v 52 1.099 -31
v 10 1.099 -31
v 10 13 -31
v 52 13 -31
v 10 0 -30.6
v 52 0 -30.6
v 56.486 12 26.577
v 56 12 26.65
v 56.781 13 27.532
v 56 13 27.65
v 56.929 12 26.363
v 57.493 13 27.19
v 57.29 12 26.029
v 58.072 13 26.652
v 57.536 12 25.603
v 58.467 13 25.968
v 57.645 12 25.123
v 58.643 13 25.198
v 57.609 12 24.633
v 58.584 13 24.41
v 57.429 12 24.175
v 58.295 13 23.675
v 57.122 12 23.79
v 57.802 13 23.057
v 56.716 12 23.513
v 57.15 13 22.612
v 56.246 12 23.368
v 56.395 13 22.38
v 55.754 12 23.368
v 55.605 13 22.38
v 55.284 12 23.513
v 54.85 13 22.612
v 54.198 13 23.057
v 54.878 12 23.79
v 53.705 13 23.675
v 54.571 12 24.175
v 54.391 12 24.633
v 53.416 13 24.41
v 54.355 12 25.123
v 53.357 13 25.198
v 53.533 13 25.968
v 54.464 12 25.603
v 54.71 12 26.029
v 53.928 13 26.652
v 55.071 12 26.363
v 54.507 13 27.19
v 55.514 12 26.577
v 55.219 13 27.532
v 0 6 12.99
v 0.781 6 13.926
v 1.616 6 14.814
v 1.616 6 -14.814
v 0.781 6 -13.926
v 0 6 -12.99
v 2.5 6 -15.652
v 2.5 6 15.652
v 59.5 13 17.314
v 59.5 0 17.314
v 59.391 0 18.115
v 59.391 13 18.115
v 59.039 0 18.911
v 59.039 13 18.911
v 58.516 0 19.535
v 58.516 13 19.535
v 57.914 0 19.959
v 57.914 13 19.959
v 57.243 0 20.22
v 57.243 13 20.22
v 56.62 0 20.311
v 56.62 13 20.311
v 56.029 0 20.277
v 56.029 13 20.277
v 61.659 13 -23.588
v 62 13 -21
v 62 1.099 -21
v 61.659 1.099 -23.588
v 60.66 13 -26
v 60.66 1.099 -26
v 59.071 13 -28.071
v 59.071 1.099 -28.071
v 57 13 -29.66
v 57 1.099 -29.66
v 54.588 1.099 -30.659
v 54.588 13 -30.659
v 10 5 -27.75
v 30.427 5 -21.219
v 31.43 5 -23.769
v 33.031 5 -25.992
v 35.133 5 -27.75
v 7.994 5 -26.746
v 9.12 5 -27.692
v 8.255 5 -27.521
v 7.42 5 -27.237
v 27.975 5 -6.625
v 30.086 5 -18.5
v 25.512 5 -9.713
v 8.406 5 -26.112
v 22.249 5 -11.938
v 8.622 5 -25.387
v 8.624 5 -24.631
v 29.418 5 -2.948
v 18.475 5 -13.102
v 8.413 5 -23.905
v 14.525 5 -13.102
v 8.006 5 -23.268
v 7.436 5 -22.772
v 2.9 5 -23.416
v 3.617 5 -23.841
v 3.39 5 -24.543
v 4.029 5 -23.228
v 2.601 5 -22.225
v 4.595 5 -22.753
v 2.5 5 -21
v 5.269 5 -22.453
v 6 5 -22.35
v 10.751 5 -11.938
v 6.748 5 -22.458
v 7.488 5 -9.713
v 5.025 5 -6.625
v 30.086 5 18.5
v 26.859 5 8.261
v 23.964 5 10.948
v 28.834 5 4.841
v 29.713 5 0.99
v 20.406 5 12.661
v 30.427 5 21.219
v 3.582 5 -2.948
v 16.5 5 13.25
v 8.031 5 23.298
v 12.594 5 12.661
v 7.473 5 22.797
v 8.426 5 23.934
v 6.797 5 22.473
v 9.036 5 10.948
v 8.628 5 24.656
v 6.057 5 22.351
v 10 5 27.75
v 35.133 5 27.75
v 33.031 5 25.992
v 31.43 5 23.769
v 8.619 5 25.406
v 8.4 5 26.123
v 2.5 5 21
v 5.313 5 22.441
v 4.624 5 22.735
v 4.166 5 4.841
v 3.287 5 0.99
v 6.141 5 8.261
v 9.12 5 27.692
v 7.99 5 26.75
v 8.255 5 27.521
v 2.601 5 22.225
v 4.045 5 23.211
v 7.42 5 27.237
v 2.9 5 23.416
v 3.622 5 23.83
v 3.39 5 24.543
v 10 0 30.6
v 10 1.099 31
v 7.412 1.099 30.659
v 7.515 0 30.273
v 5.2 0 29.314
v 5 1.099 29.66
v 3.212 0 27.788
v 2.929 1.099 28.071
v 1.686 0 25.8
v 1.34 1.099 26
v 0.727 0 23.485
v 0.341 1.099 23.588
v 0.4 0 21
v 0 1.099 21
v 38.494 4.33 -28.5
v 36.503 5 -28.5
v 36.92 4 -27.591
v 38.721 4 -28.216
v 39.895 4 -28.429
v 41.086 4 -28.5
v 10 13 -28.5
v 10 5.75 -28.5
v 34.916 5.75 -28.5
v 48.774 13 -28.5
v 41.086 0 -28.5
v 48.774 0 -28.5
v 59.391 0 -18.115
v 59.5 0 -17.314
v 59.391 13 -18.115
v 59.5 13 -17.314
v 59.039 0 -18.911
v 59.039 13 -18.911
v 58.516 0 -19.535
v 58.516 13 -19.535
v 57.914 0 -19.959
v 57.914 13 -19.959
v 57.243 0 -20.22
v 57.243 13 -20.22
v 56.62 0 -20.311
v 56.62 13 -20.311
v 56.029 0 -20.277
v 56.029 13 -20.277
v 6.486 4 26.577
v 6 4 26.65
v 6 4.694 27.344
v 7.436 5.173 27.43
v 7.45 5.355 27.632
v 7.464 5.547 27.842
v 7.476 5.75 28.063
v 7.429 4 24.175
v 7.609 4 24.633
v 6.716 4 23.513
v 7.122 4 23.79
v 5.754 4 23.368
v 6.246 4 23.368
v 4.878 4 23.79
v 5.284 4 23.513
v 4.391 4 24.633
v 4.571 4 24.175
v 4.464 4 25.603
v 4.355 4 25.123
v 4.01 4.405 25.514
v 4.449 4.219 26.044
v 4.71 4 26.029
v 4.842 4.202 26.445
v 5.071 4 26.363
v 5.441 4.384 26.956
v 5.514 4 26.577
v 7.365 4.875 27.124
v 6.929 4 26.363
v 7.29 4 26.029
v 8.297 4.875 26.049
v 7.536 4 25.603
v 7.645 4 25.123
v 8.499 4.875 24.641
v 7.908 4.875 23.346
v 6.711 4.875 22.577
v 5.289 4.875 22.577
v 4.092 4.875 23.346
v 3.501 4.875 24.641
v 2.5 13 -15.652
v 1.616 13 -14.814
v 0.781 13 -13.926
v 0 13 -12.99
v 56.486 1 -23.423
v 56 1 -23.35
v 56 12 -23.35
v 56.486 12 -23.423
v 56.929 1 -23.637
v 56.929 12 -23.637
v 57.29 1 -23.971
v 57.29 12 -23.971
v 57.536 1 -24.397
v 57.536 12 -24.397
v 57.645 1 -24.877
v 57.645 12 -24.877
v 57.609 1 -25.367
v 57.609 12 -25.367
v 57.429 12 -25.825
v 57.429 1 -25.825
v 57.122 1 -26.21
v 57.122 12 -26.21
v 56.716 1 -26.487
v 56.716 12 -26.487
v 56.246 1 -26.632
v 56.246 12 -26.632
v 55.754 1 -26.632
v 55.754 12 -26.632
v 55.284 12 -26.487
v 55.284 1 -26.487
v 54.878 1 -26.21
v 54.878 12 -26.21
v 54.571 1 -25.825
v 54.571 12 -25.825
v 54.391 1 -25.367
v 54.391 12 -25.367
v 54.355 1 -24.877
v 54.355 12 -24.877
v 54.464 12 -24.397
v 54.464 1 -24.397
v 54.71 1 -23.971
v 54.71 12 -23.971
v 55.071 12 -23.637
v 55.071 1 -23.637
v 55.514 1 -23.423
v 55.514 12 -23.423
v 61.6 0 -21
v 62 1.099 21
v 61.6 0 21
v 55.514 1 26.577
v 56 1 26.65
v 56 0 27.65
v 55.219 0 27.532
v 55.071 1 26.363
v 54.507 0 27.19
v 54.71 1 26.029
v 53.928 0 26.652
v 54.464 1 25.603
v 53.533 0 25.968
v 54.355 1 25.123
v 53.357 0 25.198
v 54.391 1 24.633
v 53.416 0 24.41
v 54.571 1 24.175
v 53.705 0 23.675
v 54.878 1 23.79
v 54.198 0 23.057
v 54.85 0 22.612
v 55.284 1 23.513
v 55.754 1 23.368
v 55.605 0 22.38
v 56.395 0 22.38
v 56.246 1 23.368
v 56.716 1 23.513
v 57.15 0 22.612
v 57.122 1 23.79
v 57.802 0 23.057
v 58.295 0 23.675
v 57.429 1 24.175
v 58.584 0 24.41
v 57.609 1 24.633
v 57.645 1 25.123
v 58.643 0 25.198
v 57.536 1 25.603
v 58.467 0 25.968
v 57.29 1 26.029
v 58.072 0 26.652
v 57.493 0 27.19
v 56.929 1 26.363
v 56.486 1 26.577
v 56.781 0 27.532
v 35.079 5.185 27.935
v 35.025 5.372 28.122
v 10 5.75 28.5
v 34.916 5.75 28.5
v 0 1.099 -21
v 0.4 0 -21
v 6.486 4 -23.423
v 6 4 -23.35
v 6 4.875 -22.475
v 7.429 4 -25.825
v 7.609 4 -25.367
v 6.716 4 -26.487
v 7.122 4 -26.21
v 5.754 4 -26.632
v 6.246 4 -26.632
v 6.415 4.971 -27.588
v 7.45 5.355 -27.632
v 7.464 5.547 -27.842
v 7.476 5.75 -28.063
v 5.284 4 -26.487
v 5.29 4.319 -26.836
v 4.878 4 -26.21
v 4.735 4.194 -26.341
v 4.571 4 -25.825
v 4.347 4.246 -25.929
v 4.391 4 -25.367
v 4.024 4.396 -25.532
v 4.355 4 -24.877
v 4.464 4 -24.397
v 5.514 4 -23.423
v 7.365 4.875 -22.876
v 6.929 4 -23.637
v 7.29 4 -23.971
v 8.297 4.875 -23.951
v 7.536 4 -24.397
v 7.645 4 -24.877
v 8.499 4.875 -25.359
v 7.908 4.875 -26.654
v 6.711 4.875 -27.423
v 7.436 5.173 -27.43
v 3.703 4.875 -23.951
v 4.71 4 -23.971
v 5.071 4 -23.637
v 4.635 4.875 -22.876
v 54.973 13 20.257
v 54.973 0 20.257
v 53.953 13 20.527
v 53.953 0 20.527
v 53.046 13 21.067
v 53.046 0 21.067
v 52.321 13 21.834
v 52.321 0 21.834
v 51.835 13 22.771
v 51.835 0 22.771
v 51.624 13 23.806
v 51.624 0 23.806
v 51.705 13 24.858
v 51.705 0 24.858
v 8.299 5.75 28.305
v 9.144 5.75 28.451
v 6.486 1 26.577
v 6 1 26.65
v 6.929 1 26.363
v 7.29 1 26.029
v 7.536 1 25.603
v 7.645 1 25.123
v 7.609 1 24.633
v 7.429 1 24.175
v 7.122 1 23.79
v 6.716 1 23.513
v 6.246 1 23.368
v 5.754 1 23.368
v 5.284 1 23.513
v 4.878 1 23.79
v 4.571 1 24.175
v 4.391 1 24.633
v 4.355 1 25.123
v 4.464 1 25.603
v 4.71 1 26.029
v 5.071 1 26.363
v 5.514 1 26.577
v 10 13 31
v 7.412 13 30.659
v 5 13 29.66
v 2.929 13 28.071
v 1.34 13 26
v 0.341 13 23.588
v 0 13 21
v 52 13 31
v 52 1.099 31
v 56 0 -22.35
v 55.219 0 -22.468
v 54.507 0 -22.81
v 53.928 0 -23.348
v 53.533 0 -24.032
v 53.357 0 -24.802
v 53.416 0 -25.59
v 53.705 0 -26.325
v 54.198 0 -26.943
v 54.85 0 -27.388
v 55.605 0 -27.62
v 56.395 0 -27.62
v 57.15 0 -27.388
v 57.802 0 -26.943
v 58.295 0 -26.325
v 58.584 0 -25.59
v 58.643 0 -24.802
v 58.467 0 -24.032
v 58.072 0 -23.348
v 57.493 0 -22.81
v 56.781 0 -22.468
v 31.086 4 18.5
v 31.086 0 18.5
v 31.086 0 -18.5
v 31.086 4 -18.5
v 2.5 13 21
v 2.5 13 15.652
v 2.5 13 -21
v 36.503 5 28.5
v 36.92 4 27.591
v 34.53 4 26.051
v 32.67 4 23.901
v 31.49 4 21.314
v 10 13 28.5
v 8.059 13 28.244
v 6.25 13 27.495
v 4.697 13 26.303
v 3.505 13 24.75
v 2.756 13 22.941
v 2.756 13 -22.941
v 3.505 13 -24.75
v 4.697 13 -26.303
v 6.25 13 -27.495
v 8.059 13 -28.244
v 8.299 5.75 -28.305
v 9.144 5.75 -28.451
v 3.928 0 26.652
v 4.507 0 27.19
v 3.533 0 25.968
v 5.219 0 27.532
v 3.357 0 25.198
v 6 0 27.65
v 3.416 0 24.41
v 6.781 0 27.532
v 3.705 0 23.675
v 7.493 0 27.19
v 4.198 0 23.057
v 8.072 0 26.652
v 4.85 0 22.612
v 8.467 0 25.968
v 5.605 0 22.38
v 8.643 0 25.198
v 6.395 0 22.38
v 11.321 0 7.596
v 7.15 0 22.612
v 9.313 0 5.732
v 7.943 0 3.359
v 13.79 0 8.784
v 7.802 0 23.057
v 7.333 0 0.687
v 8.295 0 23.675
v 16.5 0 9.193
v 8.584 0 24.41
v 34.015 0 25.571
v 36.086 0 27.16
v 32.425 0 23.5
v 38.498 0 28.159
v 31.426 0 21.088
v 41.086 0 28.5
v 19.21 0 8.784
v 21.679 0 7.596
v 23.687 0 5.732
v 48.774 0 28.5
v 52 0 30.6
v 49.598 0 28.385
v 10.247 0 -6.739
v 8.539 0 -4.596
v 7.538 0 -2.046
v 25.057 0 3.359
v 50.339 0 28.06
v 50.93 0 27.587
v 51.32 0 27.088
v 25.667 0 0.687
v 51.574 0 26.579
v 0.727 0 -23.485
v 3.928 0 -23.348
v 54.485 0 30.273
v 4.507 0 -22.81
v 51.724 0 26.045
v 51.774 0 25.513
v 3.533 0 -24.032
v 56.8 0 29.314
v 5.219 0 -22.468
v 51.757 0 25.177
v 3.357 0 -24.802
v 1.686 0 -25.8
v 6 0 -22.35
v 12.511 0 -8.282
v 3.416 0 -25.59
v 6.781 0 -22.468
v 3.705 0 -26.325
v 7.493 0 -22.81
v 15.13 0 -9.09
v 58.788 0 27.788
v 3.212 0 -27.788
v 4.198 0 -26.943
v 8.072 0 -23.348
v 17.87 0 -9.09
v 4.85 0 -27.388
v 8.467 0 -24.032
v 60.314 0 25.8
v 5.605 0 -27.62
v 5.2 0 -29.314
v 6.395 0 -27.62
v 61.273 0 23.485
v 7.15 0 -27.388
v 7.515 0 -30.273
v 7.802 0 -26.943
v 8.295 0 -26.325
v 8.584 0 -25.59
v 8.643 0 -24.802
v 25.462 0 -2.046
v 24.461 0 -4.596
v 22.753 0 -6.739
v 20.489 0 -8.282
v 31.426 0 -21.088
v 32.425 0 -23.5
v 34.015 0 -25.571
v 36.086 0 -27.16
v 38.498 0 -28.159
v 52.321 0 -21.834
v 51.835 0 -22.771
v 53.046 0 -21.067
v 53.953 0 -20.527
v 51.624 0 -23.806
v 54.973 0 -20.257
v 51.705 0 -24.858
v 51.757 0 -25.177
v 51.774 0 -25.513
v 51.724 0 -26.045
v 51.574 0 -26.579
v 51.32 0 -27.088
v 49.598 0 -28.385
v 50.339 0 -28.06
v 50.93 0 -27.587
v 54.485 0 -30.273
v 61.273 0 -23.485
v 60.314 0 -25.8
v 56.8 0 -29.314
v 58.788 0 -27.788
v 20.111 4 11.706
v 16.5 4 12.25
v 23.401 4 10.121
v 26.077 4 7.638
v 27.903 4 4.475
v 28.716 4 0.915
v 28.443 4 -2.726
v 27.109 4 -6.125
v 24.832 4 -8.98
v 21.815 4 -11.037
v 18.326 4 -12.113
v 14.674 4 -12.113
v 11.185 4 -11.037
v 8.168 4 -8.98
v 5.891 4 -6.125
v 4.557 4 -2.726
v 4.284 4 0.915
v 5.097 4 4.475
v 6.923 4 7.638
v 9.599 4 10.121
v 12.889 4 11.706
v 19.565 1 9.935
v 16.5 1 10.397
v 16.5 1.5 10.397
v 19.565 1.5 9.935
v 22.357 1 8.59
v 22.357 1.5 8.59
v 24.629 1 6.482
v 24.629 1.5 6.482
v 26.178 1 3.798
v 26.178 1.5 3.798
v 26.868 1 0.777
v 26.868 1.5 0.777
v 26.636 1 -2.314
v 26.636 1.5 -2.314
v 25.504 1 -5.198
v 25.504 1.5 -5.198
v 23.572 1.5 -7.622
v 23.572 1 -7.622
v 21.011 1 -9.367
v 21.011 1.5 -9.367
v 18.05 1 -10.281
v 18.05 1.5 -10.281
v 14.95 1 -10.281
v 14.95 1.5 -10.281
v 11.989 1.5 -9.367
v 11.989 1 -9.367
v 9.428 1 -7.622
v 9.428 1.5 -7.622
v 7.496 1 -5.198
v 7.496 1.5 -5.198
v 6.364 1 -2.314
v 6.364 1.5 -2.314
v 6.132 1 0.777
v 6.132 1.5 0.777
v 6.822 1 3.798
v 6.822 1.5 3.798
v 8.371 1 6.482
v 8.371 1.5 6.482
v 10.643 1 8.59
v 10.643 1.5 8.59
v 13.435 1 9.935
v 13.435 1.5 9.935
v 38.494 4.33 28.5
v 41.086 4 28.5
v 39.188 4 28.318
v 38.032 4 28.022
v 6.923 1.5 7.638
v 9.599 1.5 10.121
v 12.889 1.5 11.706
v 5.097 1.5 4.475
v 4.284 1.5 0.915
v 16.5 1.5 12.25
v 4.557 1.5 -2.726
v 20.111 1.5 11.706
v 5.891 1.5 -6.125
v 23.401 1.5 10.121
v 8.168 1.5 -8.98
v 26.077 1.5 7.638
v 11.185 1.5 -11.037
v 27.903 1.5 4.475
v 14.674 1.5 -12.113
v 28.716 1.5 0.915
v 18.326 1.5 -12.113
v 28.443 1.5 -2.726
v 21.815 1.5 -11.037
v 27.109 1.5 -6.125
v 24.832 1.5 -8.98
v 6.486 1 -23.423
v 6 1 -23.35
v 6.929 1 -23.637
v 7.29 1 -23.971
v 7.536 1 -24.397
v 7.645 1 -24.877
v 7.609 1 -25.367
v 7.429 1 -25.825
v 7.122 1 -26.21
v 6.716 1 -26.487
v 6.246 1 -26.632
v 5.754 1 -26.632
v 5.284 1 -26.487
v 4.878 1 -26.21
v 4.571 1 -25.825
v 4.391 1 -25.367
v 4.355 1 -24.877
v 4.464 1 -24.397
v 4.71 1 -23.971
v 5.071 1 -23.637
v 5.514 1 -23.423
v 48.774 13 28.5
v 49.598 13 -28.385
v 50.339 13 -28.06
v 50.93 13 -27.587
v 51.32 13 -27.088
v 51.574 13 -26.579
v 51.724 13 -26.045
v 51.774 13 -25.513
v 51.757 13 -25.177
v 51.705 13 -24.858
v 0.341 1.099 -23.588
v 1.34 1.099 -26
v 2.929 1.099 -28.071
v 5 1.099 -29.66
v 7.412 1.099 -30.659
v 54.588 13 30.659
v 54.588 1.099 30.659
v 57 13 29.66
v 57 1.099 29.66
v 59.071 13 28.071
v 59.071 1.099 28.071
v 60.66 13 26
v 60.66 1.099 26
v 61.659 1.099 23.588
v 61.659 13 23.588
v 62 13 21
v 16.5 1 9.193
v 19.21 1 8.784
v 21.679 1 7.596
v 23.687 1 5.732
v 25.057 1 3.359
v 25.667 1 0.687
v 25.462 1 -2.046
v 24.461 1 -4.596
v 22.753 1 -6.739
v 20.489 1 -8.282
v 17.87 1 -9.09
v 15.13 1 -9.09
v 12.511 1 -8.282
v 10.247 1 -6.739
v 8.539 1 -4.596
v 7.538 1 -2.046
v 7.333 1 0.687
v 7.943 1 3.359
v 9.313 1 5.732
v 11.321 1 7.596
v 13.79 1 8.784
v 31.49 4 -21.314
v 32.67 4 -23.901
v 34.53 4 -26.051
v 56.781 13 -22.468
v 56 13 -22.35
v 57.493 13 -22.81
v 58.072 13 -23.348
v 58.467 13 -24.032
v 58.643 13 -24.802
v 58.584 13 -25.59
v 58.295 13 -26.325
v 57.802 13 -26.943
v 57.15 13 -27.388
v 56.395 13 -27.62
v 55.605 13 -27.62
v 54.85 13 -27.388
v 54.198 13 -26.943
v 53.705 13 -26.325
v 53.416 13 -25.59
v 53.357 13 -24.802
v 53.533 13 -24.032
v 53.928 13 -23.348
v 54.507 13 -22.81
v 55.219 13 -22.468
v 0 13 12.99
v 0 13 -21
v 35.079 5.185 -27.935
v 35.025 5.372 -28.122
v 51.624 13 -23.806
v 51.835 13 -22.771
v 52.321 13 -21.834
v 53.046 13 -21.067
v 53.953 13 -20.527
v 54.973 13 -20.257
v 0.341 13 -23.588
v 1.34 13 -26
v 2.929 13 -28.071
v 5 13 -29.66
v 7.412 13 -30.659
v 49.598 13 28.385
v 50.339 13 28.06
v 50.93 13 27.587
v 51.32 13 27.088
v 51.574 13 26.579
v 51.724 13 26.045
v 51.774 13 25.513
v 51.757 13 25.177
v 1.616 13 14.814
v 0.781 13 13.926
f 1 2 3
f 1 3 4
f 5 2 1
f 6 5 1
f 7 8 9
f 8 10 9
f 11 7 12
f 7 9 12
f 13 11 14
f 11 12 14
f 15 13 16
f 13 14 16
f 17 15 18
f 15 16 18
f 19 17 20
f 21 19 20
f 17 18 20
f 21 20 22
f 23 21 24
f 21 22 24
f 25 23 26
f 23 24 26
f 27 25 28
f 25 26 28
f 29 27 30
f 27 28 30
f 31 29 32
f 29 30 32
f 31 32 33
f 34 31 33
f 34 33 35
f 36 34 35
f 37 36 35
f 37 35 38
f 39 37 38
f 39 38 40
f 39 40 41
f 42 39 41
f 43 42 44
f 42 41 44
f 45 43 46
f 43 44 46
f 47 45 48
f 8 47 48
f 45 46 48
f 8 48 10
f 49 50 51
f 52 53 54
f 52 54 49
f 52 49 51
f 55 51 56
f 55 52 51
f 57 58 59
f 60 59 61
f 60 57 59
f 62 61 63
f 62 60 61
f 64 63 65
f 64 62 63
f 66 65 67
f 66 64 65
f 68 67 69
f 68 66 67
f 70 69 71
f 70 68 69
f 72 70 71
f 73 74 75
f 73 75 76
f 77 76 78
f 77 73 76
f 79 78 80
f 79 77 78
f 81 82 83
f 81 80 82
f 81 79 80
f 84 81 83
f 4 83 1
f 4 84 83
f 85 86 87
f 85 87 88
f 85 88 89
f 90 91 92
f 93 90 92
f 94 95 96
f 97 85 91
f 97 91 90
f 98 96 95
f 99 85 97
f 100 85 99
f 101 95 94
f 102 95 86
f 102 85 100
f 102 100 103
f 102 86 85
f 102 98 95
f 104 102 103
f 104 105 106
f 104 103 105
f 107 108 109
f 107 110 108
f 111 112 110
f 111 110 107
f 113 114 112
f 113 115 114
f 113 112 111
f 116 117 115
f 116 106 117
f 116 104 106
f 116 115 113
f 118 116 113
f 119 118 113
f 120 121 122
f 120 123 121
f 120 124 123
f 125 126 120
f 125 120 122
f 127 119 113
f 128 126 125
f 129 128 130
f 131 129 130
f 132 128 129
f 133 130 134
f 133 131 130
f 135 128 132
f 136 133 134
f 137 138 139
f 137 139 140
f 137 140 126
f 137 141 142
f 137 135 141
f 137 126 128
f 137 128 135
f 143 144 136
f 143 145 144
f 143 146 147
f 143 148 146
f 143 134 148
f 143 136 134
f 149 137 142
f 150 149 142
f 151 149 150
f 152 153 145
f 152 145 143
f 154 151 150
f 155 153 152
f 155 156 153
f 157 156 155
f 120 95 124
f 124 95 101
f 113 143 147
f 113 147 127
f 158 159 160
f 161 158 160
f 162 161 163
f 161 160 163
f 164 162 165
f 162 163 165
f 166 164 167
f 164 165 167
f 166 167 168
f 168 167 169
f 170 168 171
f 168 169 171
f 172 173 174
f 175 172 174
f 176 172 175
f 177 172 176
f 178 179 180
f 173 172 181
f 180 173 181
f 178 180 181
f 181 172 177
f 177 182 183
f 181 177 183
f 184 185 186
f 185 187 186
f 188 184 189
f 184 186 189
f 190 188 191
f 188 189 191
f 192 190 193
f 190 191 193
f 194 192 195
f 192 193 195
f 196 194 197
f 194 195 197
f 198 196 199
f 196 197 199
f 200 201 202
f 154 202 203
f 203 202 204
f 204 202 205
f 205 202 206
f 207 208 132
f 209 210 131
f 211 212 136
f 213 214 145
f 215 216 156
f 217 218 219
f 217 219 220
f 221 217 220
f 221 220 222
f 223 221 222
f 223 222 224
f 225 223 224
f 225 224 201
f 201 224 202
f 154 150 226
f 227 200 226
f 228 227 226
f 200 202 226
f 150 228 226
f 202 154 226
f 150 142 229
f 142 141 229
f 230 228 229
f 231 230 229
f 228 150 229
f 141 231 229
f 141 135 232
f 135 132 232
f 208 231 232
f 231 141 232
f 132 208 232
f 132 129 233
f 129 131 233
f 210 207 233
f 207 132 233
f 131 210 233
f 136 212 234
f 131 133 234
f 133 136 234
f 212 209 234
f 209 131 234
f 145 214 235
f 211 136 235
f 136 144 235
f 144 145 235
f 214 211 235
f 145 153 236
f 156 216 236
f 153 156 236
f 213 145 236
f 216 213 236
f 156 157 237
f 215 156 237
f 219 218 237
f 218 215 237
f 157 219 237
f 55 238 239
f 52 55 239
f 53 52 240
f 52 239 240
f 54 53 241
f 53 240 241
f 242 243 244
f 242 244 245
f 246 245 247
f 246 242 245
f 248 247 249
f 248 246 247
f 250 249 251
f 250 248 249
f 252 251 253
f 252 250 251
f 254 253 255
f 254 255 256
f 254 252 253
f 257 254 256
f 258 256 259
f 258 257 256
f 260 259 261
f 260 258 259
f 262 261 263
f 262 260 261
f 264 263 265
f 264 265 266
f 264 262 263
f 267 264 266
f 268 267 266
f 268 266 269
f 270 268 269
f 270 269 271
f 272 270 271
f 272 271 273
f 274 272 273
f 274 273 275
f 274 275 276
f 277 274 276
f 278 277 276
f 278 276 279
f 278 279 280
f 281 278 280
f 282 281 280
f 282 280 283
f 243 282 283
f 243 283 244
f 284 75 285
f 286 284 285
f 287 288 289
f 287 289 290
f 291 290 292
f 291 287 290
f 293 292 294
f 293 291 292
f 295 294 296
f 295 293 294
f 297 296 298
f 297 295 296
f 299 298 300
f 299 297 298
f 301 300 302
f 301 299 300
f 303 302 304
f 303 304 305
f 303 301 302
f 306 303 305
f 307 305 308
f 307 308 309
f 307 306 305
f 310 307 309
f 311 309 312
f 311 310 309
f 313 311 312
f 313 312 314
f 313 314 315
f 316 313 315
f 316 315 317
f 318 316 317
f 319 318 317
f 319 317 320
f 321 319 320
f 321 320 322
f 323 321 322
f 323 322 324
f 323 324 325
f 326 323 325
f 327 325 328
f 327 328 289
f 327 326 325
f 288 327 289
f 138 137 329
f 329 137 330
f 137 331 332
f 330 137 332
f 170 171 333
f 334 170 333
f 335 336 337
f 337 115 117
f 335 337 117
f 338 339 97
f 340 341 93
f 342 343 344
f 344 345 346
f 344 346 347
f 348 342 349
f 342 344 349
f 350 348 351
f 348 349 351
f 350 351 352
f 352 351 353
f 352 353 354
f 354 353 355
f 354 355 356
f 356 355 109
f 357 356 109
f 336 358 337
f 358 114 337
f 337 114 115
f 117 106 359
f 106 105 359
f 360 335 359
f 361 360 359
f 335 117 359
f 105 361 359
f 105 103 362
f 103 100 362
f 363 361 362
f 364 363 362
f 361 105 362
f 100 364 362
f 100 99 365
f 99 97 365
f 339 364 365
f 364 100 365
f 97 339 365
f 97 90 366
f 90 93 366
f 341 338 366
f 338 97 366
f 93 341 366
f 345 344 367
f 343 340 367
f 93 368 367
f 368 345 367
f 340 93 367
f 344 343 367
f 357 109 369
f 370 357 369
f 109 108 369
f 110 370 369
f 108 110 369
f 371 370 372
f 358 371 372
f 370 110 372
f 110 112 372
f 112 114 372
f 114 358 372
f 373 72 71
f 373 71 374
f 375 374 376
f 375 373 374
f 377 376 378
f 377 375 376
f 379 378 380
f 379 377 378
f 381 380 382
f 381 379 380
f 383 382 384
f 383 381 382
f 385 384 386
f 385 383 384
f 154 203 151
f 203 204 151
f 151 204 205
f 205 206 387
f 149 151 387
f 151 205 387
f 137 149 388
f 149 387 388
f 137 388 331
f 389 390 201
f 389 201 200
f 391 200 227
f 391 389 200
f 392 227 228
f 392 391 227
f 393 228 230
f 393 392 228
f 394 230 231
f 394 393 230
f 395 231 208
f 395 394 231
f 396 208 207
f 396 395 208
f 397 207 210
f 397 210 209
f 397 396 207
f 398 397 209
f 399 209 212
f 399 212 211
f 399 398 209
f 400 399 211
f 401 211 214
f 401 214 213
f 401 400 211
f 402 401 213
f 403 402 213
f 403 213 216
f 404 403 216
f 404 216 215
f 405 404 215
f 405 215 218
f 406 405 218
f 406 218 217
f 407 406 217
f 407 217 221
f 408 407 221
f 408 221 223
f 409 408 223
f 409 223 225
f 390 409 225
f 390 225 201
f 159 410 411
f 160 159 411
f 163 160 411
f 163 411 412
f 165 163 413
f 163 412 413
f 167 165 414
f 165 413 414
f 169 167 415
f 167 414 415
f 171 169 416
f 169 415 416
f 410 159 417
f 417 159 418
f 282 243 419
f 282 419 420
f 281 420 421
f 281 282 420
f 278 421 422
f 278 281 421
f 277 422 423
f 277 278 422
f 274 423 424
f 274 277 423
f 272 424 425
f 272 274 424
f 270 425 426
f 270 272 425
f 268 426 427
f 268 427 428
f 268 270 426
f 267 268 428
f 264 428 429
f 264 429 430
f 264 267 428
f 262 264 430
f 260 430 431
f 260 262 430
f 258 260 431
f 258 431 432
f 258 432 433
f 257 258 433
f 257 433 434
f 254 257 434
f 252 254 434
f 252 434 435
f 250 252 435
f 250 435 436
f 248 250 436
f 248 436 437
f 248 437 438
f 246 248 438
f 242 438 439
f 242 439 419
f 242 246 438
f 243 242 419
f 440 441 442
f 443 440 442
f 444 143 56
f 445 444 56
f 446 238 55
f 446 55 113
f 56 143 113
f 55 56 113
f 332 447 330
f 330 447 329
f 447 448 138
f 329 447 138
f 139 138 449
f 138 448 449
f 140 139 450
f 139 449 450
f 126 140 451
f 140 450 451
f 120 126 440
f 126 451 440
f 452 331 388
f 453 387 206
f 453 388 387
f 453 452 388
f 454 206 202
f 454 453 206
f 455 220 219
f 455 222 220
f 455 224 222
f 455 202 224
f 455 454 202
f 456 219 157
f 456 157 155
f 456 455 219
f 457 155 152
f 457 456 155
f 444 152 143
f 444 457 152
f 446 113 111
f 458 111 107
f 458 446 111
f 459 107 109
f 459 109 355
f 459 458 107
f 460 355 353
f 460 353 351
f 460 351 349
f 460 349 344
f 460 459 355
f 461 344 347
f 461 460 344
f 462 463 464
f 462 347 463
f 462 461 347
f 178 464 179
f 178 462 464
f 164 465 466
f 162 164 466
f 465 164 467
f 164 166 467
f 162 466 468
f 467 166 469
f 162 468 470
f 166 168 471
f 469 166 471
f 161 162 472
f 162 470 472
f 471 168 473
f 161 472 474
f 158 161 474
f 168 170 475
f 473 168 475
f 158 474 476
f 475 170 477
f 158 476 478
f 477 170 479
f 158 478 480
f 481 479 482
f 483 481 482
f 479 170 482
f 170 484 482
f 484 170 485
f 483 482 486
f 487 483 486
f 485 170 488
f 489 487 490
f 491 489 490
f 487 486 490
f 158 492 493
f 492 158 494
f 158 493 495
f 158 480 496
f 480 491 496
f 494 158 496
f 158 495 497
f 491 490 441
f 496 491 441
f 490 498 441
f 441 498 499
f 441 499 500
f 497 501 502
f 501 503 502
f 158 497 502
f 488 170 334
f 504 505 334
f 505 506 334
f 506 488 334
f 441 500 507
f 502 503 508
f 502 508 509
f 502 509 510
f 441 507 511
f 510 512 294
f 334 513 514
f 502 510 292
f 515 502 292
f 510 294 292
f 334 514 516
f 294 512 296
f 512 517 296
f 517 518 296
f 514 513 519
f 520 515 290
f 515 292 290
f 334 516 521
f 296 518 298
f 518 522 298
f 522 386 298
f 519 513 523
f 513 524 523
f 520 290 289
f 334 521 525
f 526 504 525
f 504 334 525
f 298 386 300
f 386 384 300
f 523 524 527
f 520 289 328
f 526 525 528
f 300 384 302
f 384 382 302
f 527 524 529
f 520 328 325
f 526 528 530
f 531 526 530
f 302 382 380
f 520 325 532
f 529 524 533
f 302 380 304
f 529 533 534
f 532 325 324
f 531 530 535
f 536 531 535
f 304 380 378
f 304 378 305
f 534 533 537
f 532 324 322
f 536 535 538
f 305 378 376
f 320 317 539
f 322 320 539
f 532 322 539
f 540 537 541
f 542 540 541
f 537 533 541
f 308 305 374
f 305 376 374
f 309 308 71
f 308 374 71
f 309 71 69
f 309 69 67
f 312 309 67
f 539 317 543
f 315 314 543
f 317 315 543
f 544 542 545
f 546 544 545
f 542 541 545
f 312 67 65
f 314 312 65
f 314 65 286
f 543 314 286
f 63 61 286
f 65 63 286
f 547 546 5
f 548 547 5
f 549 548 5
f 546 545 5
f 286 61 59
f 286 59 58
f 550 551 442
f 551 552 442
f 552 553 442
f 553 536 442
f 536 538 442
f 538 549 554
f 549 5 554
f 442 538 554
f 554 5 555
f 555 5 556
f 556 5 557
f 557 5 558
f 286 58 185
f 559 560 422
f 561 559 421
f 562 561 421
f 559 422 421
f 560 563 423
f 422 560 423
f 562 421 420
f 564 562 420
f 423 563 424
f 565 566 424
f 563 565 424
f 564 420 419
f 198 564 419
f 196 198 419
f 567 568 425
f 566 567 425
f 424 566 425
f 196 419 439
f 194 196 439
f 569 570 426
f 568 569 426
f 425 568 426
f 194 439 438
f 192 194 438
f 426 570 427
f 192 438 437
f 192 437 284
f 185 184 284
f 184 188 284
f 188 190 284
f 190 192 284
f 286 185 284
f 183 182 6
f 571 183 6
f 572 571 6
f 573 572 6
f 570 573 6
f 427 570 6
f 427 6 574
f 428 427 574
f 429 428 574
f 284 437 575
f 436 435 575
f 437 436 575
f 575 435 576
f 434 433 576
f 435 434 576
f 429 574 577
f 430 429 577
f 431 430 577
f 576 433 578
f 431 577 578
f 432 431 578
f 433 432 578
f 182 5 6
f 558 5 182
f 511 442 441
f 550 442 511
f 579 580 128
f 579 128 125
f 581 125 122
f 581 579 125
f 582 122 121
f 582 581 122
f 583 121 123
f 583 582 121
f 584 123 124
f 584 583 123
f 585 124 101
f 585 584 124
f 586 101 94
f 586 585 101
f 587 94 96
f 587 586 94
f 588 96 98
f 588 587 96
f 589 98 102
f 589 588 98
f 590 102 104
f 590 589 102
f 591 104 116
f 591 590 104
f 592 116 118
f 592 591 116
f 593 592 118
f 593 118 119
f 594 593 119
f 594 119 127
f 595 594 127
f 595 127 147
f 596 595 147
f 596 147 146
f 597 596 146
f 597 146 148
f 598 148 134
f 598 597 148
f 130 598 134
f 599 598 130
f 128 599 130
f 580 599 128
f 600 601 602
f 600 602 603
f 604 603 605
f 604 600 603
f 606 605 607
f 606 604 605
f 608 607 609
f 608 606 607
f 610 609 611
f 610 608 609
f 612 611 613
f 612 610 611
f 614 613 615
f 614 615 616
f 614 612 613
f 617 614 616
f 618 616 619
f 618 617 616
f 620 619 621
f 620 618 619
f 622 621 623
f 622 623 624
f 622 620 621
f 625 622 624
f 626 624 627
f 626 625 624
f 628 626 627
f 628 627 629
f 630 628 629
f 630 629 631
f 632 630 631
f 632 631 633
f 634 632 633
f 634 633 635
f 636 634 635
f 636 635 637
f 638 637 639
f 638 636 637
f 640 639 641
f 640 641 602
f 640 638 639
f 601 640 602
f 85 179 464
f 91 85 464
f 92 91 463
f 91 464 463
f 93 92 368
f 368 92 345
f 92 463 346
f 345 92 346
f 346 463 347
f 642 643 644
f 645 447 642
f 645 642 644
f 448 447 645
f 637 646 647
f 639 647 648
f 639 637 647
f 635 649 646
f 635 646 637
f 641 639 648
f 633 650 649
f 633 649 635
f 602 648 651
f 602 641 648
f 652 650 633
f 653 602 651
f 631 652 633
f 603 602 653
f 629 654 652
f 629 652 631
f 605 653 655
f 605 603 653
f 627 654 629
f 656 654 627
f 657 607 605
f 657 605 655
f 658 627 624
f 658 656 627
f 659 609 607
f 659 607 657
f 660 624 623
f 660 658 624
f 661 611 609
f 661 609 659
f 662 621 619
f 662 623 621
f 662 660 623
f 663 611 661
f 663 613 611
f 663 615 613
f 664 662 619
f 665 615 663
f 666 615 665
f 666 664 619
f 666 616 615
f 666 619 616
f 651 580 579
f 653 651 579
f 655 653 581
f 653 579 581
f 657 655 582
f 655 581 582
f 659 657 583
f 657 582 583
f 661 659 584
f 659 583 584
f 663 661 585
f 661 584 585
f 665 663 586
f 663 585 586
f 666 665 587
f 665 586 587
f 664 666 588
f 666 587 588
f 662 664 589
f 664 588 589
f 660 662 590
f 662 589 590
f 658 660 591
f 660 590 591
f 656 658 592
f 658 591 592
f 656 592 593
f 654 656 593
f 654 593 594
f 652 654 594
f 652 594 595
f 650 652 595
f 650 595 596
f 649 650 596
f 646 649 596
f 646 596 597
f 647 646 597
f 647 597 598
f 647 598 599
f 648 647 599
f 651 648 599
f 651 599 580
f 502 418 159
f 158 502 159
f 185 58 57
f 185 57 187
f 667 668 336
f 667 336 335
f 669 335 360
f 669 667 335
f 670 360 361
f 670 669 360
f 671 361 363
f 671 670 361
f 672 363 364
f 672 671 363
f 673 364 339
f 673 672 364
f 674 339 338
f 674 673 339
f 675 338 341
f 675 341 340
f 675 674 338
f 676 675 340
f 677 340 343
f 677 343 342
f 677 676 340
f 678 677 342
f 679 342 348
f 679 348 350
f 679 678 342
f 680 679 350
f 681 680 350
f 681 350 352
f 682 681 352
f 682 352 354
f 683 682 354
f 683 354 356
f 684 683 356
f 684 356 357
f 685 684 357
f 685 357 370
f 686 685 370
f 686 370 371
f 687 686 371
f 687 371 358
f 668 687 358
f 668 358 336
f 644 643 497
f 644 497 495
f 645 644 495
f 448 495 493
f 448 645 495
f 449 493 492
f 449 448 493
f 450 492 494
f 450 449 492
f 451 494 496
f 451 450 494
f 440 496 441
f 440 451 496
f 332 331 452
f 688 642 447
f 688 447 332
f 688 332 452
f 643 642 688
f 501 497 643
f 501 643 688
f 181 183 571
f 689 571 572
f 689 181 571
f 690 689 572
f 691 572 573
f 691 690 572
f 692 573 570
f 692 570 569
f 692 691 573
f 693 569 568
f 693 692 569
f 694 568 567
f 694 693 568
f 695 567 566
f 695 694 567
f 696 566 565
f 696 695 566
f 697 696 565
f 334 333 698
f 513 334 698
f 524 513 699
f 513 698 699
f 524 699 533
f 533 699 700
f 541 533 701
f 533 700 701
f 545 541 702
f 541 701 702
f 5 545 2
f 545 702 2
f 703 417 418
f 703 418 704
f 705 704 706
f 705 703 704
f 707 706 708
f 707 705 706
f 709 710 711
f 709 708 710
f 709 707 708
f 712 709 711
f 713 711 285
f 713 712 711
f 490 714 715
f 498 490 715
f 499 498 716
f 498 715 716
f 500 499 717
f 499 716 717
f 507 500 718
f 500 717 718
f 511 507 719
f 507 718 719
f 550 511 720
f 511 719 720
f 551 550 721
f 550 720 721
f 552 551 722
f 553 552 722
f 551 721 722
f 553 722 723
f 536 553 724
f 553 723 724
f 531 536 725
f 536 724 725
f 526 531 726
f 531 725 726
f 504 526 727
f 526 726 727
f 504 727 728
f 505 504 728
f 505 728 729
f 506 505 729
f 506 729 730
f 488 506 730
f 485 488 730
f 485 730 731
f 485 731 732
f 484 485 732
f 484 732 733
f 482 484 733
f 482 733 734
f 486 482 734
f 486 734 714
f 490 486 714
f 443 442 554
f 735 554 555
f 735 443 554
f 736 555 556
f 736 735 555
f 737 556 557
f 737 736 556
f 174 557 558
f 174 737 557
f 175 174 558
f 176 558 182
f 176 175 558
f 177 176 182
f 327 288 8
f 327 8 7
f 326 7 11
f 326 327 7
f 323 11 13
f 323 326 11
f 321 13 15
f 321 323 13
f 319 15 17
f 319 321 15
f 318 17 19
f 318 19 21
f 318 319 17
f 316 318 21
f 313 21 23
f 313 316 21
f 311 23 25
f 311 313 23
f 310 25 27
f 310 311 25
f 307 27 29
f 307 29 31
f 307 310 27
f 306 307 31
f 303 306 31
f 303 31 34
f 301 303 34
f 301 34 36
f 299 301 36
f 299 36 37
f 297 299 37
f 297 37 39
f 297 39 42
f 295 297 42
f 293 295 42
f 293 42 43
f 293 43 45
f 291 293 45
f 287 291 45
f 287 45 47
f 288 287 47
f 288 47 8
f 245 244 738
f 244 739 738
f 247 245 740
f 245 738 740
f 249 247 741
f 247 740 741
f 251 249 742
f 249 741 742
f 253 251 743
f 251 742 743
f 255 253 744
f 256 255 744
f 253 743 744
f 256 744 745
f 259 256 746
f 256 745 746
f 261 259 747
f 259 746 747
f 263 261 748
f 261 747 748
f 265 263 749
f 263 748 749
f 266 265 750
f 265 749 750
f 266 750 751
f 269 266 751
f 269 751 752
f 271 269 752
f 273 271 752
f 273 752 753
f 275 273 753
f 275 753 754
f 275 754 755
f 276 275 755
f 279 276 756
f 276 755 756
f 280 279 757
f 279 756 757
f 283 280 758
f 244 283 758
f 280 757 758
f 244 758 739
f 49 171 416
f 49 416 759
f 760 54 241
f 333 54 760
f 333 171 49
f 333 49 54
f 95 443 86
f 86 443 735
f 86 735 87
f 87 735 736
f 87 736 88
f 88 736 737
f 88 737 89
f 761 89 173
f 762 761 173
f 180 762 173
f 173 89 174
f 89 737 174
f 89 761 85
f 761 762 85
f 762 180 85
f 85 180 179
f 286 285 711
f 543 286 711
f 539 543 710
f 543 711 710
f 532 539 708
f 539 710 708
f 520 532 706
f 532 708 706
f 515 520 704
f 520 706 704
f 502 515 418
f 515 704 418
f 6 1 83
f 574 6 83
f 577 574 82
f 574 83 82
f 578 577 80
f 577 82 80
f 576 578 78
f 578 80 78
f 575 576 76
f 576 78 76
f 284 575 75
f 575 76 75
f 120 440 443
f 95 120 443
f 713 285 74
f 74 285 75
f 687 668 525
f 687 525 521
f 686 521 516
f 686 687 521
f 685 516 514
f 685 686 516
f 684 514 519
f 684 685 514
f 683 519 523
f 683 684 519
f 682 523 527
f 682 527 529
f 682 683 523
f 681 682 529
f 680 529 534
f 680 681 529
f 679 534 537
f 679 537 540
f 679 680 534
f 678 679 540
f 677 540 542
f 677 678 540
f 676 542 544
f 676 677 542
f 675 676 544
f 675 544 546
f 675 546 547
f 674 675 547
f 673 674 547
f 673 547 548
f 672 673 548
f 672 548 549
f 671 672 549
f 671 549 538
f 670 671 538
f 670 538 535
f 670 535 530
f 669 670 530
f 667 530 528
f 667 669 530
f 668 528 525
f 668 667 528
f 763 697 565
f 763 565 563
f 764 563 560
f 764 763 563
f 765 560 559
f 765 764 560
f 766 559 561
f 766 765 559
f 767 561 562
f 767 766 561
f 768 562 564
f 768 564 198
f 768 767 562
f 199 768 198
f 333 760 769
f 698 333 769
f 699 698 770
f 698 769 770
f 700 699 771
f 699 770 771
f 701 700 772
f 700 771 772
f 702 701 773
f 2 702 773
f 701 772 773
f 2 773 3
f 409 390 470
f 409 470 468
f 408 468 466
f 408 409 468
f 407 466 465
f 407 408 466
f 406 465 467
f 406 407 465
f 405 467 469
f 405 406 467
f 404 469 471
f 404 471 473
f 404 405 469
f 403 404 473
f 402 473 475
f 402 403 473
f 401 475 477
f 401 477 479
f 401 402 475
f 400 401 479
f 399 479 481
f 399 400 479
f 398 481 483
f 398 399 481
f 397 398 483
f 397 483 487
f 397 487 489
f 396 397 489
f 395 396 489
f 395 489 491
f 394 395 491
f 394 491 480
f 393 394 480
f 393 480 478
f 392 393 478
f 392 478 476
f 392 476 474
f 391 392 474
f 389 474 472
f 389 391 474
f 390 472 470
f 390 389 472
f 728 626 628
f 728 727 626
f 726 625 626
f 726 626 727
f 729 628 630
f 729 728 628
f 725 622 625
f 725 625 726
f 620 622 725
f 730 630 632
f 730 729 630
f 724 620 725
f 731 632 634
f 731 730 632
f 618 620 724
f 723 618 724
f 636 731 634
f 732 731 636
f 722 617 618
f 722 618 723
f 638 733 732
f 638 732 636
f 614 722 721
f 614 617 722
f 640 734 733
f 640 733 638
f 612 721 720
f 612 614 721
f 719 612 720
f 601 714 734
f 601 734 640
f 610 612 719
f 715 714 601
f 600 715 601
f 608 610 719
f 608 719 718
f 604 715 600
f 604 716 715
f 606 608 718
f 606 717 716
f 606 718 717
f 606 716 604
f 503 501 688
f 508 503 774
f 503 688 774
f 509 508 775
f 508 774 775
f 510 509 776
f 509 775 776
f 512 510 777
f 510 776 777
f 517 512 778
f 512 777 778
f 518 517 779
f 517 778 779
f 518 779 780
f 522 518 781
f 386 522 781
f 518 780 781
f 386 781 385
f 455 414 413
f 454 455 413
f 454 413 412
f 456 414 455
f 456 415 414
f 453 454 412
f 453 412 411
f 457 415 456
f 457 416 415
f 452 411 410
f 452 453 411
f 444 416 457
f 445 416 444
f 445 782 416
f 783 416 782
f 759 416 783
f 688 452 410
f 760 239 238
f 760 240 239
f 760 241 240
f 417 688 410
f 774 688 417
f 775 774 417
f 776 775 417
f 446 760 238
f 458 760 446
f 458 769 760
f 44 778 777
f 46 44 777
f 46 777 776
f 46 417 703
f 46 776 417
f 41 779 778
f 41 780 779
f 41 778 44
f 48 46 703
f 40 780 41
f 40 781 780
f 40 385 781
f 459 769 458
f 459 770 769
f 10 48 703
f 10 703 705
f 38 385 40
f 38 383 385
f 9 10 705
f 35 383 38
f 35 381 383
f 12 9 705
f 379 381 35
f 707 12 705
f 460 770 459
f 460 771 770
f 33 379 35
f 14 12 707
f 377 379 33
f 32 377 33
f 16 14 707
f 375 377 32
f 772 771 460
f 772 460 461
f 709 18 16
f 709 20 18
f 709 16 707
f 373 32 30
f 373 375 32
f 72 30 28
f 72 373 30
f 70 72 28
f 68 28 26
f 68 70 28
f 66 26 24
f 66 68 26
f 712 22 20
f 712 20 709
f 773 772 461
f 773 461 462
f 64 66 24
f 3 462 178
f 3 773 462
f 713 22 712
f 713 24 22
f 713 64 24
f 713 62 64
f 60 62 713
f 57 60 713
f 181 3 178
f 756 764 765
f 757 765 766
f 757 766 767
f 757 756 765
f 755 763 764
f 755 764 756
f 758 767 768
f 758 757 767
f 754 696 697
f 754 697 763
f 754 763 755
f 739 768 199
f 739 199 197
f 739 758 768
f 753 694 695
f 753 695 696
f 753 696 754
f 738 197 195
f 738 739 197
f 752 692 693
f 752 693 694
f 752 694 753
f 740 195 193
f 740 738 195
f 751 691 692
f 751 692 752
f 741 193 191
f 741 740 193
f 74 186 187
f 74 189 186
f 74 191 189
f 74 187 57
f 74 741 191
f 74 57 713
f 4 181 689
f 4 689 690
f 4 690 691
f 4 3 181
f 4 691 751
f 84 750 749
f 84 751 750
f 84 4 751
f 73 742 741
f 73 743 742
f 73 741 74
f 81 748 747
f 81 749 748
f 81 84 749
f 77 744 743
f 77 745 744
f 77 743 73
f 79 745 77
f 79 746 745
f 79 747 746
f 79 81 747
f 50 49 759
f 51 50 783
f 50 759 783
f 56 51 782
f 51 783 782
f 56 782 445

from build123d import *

# Parameters (mm, degrees)
CROQUIS1_W                 = 62
CROQUIS1_H                 = 62
SALIENTE_EXTRUIR1_DEPTH    = 13
REDONDEO1_R                = 10
REDONDEO2_R                = 10
VACIADO1_T                 = -2.5
CROQUIS2_R                 = 21
CORTAR_EXTRUIR1_DEPTH      = 7
SALIENTE_EXTRUIR2_DEPTH    = 5
CROQUIS6_R                 = 12.25
CORTAR_EXTRUIR4_DEPTH      = 4
REDONDEO3_R                = 10
CROQUIS8_R                 = 3.813498279
SALIENTE_EXTRUIR3_DEPTH    = 13
REDONDEO4_R                = 3
CORTAR_EXTRUIR7_DEPTH      = 71.52659088
CORTAR_EXTRUIR7_DEPTH_BACK = 71.52659088
CROQUIS9_R                 = 1.65
CHAFL_N1_SIZE              = 1
CHAFL_N2_SIZE              = 1
CHAFL_N3_SIZE              = 1
CHAFL_N4_SIZE              = 0.4
CHAFL_N4_SIZE2             = 1.098990968
CHAFL_N5_SIZE              = 1
CROQUIS10_R                = 14.000593708
CROQUIS10_R_2              = 10.396987038
SALIENTE_EXTRUIR4_DEPTH    = 0.5
CROQUIS11_R                = 9.192870702
CORTAR_EXTRUIR8_DEPTH      = 71.349129497
CHAFL_N6_SIZE              = 0.75


with BuildPart() as part:
    # Croquis1 → Saliente-Extruir1 (new body)
    with BuildSketch(Plane(origin=(0, 0, 0), x_dir=(1, 0, 0), z_dir=(0, 1, 0))):
        with Locations((31, 0)):
            Rectangle(CROQUIS1_W, CROQUIS1_H)
    extrude(amount=SALIENTE_EXTRUIR1_DEPTH)

    # Redondeo1
    redondeo1_edges = [part.edges().sort_by_distance(p)[0] for p in [
        (62, 6.5, -31),
        (62, 6.5, 31),
    ]]
    fillet(redondeo1_edges, radius=REDONDEO1_R)

    # Redondeo2
    redondeo2_edges = [part.edges().sort_by_distance(p)[0] for p in [
        (0, 6.5, -31),
        (0, 6.5, 31),
    ]]
    fillet(redondeo2_edges, radius=REDONDEO2_R)

    # Vaciado1
    vaciado1_openings = [part.faces().sort_by_distance(p)[0] for p in [
        (31, 13, 0),
        (31, 0, 0),
    ]]
    offset(amount=VACIADO1_T, openings=vaciado1_openings, kind=Kind.INTERSECTION)

    # Croquis2 → Cortar-Extruir1 (cut)
    with BuildSketch(Plane(origin=(0, 13, 0), x_dir=(1, 0, 0), z_dir=(0, 1, 0))):
        with Locations((16.5, 0)):
            Circle(CROQUIS2_R)
    extrude(amount=-CORTAR_EXTRUIR1_DEPTH, mode=Mode.SUBTRACT)

    # Croquis4 → Saliente-Extruir2 (add)
    with BuildSketch(Plane.XZ):
        with BuildLine():
            Line((7.085748882, 29.157404391), (31.085748882, 29.157404391))
            Line((31.085748882, 29.157404391), (31.085748882, -29.960159471))
            Line((31.085748882, -29.960159471), (7.085748882, -29.960159471))
            ThreePointArc((7.085748882, -29.960159471), (3.550214976, -28.495693377), (2.085748882, -24.960159471))
            Line((2.085748882, -24.960159471), (2.085748882, 24.157404391))
            ThreePointArc((2.085748882, 24.157404391), (3.550214976, 27.692938297), (7.085748882, 29.157404391))
        make_face()
    extrude(amount=-SALIENTE_EXTRUIR2_DEPTH)

    # Croquis6 → Cortar-Extruir4 (cut)
    with BuildSketch(Plane(origin=(0, 5, 0), x_dir=(1, 0, 0), z_dir=(0, 1, 0))):
        with Locations(Location((16.5, 0, 0), (0, 0, 270))):
            Circle(CROQUIS6_R)
    extrude(amount=-CORTAR_EXTRUIR4_DEPTH, mode=Mode.SUBTRACT)

    # Redondeo3
    redondeo3_edges = [part.edges().sort_by_distance(p)[0] for p in [
        (31.085748882, 2.5, -28.5),
        (31.085748882, 2.5, 28.5),
    ]]
    fillet(redondeo3_edges, radius=REDONDEO3_R)

    # Croquis8 → Saliente-Extruir3 (add)
    with BuildSketch(Plane(origin=(0, 13, 0), x_dir=(1, 0, 0), z_dir=(0, 1, 0))):
        with Locations((55.43014903, 24.042715564)):
            Circle(CROQUIS8_R)
        with Locations((55.43014903, -24.042715564)):
            Circle(CROQUIS8_R)
    extrude(amount=-SALIENTE_EXTRUIR3_DEPTH)

    # Redondeo4
    redondeo4_edges = [part.edges().sort_by_distance(p)[0] for p in [
        (55.076843568, 6.5, 27.839812399),
        (59.157992619, 6.5, 23.239004614),
        (59.157992619, 6.5, -23.239004614),
        (55.076843568, 6.5, -27.839812399),
    ]]
    fillet(redondeo4_edges, radius=REDONDEO4_R)

    # Croquis9 → Cortar-Extruir7 (cut, two sides: drawn at the far end of the back side and taken through both)
    with BuildSketch(Plane(origin=(0, 13, 0), x_dir=(1, 0, 0), z_dir=(0, 1, 0)).offset(-CORTAR_EXTRUIR7_DEPTH_BACK)):
        with Locations(Location((6, 25, 0), (0, 0, 270))):
            Circle(CROQUIS9_R)
        with Locations(Location((56, -25, 0), (0, 0, 270))):
            Circle(CROQUIS9_R)
        with Locations(Location((56, 25, 0), (0, 0, 270))):
            Circle(CROQUIS9_R)
        with Locations(Location((6, -25, 0), (0, 0, 270))):
            Circle(CROQUIS9_R)
    extrude(amount=CORTAR_EXTRUIR7_DEPTH + CORTAR_EXTRUIR7_DEPTH_BACK, mode=Mode.SUBTRACT)

    # Chaflán1
    # the kernel refuses this chamfer: 1 mm, written as the material it takes off along each edge
    with BuildSketch(Plane(origin=(6, 5, 25), x_dir=(0, 0, 1), z_dir=(-1, 0, 0))) as chafl_n1_piece_1_section:
        Polygon((1.65, -CHAFL_N1_SIZE), (1.65 + CHAFL_N1_SIZE, 0), (1.65, 0), align=None)
    chafl_n1_piece_1 = revolve(axis=Axis((6, 5, 25), (0, 1, 0)), mode=Mode.PRIVATE)
    chafl_n1_piece_1 = chafl_n1_piece_1 & Plane(origin=(10, 4.51284456, 21), x_dir=(-1, 0, 0), z_dir=(0, 1, 0)) * Cylinder(7.5, 11, mode=Mode.PRIVATE)
    add(chafl_n1_piece_1, mode=Mode.SUBTRACT)
    with BuildSketch(Plane(origin=(56, 13, -25), x_dir=(0, 0, 1), z_dir=(-1, 0, 0))) as chafl_n1_piece_2:
        Polygon((1.65, -CHAFL_N1_SIZE), (1.65 + CHAFL_N1_SIZE, 0), (1.65, 0), align=None)
    revolve(axis=Axis((56, 13, -25), (0, 1, 0)), mode=Mode.SUBTRACT)
    with BuildSketch(Plane(origin=(56, 13, 25), x_dir=(0, 0, 1), z_dir=(-1, 0, 0))) as chafl_n1_piece_3:
        Polygon((1.65, -CHAFL_N1_SIZE), (1.65 + CHAFL_N1_SIZE, 0), (1.65, 0), align=None)
    revolve(axis=Axis((56, 13, 25), (0, 1, 0)), mode=Mode.SUBTRACT)
    with BuildSketch(Plane(origin=(6, 5, -25), x_dir=(0, 0, 1), z_dir=(-1, 0, 0))) as chafl_n1_piece_4_section:
        Polygon((1.65, -CHAFL_N1_SIZE), (1.65 + CHAFL_N1_SIZE, 0), (1.65, 0), align=None)
    chafl_n1_piece_4 = revolve(axis=Axis((6, 5, -25), (0, 1, 0)), mode=Mode.PRIVATE)
    chafl_n1_piece_4 = chafl_n1_piece_4 & Plane(origin=(10, 4.512844583, -21), x_dir=(0, 0, -1), z_dir=(0, 1, 0)) * Cylinder(7.5, 11, mode=Mode.PRIVATE)
    add(chafl_n1_piece_4, mode=Mode.SUBTRACT)

    # Chaflán2
    chafl_n2_edges = [part.edges().sort_by_distance(p)[0] for p in [
        (16.5, 5, -12.25),
    ]]
    chamfer(chafl_n2_edges, length=CHAFL_N2_SIZE)

    # Chaflán3
    chafl_n3_edges = [part.edges().sort_by_distance(p)[0] for p in [
        (31.085748882, 5, 0),
        (34.01468107, 5, 25.571067812),
        (34.01468107, 5, -25.571067812),
    ]]
    chamfer(chafl_n3_edges, length=CHAFL_N3_SIZE)

    # Chaflán4
    chafl_n4_edges = [part.edges().sort_by_distance(p)[0] for p in [
        (31, 0, -31),
        (62, 0, 0),
        (59.071067812, 0, 28.071067812),
        (59.071067812, 0, -28.071067812),
        (31, 0, 31),
        (0, 0, 0),
        (2.928932188, 0, -28.071067812),
        (2.928932188, 0, 28.071067812),
    ]]
    chafl_n4_side = [part.faces().sort_by_distance(p)[0] for p in [
        (22.290109536, 0, 0),
    ]]
    chamfer(chafl_n4_edges, length=CHAFL_N4_SIZE, length2=CHAFL_N4_SIZE2, reference=chafl_n4_side[0])

    # Chaflán5
    chafl_n5_edges = [part.edges().sort_by_distance(p)[0] for p in [
        (6, 0, 23.35),
        (56, 0, -26.65),
        (56, 0, 23.35),
        (6, 0, -26.65),
    ]]
    chamfer(chafl_n5_edges, length=CHAFL_N5_SIZE)

    # Croquis10 → Saliente-Extruir4 (add)
    with BuildSketch(Plane(origin=(0, 1, 0), x_dir=(1, 0, 0), z_dir=(0, 1, 0))):
        with Locations((16.5, 0)):
            Circle(CROQUIS10_R)
        with Locations(Location((16.5, 0, 0), (0, 0, 270))):
            Circle(CROQUIS10_R_2, mode=Mode.SUBTRACT)
    extrude(amount=SALIENTE_EXTRUIR4_DEPTH)

    # Croquis11 → Cortar-Extruir8 (cut, through all)
    with BuildSketch(Plane(origin=(0, 1, 0), x_dir=(1, 0, 0), z_dir=(0, 1, 0))):
        with Locations(Location((16.5, 0, 0), (0, 0, 270))):
            Circle(CROQUIS11_R)
    extrude(amount=-CORTAR_EXTRUIR8_DEPTH, mode=Mode.SUBTRACT)

    # Chaflán6
    chafl_n6_edges = [part.edges().sort_by_distance(p)[0] for p in [
        (8.173443839, 5, 28.274179857),
        (23.251586594, 5, 28.5),
        (8.173443839, 5, -28.274179857),
        (23.251586594, 5, -28.5),
    ]]
    chamfer(chafl_n6_edges, length=CHAFL_N6_SIZE)


solid = part.part
